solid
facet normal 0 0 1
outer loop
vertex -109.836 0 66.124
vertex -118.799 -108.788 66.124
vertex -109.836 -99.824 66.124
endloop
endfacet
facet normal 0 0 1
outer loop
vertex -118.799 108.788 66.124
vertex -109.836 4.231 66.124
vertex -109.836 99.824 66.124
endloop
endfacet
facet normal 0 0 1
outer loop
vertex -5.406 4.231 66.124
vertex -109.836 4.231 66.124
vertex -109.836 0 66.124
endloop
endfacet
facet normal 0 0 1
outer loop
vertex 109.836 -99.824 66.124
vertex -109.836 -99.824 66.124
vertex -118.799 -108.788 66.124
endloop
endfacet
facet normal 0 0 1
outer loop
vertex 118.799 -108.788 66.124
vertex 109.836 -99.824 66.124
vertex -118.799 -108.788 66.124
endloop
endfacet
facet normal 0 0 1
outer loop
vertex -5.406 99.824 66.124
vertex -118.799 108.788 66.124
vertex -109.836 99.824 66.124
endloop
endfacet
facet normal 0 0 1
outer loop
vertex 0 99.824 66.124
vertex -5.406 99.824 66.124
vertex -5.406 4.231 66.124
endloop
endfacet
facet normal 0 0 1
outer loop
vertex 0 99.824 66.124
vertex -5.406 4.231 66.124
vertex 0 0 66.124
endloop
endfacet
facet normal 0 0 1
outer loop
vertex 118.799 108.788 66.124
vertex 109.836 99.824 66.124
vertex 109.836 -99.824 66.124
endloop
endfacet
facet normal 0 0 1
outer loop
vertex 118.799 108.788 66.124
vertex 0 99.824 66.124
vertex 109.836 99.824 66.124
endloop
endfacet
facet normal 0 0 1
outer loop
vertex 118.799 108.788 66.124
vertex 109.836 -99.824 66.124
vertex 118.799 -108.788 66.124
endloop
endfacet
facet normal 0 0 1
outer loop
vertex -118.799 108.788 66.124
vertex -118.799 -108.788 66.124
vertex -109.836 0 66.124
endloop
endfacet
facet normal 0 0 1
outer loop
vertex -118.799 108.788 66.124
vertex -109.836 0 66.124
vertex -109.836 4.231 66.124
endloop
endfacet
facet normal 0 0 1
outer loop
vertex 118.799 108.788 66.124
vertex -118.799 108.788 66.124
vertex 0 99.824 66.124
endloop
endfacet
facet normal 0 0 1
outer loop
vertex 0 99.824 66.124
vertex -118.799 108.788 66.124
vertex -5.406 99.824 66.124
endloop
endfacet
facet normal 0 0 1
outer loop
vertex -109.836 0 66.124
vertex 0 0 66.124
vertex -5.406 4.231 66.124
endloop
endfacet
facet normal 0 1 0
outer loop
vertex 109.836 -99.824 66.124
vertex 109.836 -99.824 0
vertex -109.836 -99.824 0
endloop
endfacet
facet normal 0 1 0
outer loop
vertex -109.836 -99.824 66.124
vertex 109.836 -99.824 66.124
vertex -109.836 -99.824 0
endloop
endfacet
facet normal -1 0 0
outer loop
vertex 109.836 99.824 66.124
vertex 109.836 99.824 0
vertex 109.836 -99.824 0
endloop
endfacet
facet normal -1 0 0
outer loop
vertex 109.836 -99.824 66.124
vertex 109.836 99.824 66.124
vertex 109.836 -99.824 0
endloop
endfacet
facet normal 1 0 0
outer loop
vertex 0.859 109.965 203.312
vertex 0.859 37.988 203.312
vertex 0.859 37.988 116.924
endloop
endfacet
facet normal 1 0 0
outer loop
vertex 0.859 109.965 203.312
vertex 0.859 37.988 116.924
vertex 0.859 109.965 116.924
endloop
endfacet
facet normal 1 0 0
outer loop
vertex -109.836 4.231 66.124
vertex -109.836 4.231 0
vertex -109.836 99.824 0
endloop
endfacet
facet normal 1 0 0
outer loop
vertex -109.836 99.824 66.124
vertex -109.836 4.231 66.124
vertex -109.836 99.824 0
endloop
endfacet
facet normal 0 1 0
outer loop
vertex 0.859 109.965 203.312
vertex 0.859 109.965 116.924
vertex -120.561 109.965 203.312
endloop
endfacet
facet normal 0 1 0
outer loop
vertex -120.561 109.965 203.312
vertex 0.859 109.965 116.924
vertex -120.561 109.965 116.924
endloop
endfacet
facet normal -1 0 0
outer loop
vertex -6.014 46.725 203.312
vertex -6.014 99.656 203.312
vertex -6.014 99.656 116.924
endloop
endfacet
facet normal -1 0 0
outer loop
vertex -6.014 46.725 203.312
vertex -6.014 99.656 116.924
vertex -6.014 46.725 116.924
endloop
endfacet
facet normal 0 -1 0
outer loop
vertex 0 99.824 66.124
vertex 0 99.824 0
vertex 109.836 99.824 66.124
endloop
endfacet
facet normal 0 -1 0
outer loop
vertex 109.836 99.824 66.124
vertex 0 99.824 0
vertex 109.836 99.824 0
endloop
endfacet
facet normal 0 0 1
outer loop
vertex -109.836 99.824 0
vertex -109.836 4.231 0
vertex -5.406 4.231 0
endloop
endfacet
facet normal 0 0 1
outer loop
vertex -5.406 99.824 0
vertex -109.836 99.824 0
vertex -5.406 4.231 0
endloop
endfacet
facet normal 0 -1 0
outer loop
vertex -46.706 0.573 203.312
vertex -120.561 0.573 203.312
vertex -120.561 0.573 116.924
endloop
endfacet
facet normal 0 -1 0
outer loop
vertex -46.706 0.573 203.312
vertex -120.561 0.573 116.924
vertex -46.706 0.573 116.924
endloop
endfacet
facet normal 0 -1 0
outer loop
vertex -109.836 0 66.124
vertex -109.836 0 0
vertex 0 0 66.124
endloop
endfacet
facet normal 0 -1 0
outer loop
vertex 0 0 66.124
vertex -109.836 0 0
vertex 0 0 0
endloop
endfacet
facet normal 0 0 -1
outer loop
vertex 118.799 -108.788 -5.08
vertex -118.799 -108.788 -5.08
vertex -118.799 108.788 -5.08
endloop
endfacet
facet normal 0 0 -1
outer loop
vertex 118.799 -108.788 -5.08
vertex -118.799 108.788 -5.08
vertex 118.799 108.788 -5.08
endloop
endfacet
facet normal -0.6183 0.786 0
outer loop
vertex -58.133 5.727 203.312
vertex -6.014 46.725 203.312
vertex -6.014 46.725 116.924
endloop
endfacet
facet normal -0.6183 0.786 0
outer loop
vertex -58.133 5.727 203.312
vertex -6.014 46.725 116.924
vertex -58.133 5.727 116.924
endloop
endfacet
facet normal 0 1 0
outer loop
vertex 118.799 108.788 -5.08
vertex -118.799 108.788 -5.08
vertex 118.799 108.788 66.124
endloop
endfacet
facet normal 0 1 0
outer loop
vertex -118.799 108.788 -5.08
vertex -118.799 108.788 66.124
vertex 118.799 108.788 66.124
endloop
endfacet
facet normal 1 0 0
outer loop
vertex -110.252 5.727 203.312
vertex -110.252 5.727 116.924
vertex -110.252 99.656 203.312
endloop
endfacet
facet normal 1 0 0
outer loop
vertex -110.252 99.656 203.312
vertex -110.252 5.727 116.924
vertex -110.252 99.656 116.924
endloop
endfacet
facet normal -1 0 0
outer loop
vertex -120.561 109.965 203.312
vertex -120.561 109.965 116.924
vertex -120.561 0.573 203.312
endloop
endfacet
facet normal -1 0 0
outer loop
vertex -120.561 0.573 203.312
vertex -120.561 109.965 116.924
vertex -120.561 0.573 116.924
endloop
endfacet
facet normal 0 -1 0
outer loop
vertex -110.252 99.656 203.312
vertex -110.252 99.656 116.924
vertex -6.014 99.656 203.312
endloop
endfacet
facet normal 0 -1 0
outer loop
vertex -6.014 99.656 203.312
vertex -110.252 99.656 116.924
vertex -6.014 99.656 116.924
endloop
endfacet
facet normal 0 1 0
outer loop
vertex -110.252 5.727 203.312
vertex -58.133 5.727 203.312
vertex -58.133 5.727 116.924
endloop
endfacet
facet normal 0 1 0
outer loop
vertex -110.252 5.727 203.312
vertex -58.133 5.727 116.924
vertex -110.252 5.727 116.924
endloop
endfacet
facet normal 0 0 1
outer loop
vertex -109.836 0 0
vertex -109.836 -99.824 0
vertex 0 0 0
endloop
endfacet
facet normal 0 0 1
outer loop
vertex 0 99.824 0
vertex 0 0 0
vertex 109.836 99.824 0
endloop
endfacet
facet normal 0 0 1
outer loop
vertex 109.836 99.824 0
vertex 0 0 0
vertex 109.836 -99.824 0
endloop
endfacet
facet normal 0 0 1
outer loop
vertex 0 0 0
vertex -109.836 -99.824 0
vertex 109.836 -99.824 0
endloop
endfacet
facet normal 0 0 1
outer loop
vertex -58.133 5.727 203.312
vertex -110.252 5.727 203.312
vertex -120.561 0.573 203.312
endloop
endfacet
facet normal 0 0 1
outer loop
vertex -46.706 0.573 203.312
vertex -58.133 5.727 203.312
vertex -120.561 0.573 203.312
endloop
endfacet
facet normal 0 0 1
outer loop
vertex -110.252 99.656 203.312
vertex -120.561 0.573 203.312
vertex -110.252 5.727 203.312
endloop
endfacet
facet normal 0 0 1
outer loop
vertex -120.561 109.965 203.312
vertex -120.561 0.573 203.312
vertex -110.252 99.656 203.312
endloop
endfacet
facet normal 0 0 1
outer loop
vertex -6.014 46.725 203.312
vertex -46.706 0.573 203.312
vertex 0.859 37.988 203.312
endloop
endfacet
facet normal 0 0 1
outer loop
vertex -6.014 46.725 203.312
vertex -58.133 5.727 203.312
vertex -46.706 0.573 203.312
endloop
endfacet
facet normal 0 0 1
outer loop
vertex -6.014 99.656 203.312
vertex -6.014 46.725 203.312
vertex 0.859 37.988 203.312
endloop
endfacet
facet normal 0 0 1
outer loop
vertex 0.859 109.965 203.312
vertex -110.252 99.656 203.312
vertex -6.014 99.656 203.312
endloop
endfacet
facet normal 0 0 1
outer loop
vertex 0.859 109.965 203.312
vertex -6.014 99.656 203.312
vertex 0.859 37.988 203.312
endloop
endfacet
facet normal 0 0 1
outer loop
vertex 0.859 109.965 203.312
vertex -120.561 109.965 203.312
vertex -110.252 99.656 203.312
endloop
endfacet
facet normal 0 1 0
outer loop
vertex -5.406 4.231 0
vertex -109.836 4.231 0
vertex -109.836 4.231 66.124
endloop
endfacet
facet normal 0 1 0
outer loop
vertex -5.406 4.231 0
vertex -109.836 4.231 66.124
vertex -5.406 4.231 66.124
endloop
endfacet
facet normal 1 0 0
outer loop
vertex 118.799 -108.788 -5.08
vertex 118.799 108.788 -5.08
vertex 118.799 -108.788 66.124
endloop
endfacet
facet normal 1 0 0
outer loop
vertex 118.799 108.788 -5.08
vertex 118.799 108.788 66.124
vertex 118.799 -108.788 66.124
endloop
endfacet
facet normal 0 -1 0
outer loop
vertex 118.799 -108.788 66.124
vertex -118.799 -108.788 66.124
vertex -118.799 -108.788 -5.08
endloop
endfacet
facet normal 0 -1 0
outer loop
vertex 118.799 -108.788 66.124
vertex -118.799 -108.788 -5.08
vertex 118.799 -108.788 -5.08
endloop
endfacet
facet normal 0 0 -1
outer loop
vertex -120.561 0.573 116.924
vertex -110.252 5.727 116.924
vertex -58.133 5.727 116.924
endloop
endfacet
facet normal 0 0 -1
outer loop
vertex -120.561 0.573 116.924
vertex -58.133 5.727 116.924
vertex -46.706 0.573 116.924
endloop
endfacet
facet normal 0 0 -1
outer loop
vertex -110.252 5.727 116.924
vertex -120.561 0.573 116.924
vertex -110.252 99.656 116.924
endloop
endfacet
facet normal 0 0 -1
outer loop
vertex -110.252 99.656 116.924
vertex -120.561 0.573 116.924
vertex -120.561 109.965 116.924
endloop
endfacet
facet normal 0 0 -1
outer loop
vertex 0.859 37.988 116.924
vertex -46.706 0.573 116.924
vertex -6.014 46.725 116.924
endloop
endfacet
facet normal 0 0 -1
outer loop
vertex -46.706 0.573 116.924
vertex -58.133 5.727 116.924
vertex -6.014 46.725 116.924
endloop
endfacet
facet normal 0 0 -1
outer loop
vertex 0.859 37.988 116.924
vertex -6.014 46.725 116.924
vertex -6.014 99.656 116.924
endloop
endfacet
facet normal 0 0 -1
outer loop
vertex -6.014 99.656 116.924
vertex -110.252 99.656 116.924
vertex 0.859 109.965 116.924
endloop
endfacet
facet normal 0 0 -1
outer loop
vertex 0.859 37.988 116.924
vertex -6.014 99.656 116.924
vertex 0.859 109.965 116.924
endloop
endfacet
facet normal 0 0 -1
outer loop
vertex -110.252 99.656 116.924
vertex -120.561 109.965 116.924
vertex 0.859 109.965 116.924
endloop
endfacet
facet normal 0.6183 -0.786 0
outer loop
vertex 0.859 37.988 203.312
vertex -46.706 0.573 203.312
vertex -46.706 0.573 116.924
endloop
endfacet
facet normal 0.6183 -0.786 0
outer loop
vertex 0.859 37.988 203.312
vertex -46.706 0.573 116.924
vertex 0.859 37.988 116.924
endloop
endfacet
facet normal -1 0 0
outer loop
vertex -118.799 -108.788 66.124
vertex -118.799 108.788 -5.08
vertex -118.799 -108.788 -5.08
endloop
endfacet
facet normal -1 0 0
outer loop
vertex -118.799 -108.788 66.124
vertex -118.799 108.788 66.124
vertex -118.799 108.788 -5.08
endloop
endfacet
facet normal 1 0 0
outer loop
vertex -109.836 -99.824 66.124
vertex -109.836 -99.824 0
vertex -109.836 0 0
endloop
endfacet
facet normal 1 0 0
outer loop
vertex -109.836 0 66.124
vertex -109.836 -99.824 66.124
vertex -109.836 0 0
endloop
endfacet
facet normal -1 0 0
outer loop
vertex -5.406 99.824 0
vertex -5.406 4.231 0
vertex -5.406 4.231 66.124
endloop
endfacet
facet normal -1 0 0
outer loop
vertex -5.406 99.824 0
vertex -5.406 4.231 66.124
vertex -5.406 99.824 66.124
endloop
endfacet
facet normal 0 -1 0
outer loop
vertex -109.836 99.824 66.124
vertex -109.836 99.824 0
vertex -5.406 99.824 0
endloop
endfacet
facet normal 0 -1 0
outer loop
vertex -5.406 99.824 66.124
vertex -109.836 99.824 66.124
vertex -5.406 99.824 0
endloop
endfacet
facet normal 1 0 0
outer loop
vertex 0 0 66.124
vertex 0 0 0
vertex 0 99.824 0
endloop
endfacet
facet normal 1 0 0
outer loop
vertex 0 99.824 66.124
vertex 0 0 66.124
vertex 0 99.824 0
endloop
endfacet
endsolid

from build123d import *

# Parameters (mm, degrees)
F0_W     = 237.5977933407
F0_H     = 217.5752520561
F0_W_2   = 104.4297614135
F0_H_2   = 95.5936643295
F1_DEPTH = 66.12438
F2_W     = 237.5977933407
F2_H     = 217.5752520561
F3_DEPTH = 5.08
F6_DEPTH = 86.38789


with BuildPart() as f1:
    # F0 (on Top) → F1 (new body)
    with BuildSketch(Plane.XY):
        Rectangle(F0_W, F0_H)
        with Locations((-57.6206843834, 52.0274622831)):
            Rectangle(F0_W_2, F0_H_2, mode=Mode.SUBTRACT)
        Polygon((109.8355650902, -99.8242944479), (-109.8355650902, -99.8242944479), (-109.8355650902, 0), (0, 0), (0, 4.2306301184), (0, 99.8242944479), (109.8355650902, 99.8242944479), align=None, mode=Mode.SUBTRACT)
    extrude(amount=F1_DEPTH)

    # F2 (on face) → F3 (join)
    with BuildSketch(Plane(origin=(0, 0, 0), x_dir=(1, 0, 0), z_dir=(0, 0, -1))):
        Rectangle(F2_W, F2_H)
    extrude(amount=F3_DEPTH)


with BuildPart() as f6:
    # F5 (on offset) → F6 (new body)
    with BuildSketch(Plane.XY.offset(116.92438)):
        Polygon((0.8591034566, 109.9652573466), (-120.560862124, 109.9652573466), (-120.560862124, 0.5727356765), (-46.7055755058, 0.5727356765), (0.8591034566, 37.9882634563), align=None)
        Polygon((-110.2516278625, 5.7273572311), (-110.2516278625, 99.6560156345), (-6.0137277469, 99.6560156345), (-6.0137277469, 46.725384891), (-58.1326778047, 5.7273572311), align=None, mode=Mode.SUBTRACT)
    extrude(amount=F6_DEPTH)


solid = Compound([f1.part, f6.part])
